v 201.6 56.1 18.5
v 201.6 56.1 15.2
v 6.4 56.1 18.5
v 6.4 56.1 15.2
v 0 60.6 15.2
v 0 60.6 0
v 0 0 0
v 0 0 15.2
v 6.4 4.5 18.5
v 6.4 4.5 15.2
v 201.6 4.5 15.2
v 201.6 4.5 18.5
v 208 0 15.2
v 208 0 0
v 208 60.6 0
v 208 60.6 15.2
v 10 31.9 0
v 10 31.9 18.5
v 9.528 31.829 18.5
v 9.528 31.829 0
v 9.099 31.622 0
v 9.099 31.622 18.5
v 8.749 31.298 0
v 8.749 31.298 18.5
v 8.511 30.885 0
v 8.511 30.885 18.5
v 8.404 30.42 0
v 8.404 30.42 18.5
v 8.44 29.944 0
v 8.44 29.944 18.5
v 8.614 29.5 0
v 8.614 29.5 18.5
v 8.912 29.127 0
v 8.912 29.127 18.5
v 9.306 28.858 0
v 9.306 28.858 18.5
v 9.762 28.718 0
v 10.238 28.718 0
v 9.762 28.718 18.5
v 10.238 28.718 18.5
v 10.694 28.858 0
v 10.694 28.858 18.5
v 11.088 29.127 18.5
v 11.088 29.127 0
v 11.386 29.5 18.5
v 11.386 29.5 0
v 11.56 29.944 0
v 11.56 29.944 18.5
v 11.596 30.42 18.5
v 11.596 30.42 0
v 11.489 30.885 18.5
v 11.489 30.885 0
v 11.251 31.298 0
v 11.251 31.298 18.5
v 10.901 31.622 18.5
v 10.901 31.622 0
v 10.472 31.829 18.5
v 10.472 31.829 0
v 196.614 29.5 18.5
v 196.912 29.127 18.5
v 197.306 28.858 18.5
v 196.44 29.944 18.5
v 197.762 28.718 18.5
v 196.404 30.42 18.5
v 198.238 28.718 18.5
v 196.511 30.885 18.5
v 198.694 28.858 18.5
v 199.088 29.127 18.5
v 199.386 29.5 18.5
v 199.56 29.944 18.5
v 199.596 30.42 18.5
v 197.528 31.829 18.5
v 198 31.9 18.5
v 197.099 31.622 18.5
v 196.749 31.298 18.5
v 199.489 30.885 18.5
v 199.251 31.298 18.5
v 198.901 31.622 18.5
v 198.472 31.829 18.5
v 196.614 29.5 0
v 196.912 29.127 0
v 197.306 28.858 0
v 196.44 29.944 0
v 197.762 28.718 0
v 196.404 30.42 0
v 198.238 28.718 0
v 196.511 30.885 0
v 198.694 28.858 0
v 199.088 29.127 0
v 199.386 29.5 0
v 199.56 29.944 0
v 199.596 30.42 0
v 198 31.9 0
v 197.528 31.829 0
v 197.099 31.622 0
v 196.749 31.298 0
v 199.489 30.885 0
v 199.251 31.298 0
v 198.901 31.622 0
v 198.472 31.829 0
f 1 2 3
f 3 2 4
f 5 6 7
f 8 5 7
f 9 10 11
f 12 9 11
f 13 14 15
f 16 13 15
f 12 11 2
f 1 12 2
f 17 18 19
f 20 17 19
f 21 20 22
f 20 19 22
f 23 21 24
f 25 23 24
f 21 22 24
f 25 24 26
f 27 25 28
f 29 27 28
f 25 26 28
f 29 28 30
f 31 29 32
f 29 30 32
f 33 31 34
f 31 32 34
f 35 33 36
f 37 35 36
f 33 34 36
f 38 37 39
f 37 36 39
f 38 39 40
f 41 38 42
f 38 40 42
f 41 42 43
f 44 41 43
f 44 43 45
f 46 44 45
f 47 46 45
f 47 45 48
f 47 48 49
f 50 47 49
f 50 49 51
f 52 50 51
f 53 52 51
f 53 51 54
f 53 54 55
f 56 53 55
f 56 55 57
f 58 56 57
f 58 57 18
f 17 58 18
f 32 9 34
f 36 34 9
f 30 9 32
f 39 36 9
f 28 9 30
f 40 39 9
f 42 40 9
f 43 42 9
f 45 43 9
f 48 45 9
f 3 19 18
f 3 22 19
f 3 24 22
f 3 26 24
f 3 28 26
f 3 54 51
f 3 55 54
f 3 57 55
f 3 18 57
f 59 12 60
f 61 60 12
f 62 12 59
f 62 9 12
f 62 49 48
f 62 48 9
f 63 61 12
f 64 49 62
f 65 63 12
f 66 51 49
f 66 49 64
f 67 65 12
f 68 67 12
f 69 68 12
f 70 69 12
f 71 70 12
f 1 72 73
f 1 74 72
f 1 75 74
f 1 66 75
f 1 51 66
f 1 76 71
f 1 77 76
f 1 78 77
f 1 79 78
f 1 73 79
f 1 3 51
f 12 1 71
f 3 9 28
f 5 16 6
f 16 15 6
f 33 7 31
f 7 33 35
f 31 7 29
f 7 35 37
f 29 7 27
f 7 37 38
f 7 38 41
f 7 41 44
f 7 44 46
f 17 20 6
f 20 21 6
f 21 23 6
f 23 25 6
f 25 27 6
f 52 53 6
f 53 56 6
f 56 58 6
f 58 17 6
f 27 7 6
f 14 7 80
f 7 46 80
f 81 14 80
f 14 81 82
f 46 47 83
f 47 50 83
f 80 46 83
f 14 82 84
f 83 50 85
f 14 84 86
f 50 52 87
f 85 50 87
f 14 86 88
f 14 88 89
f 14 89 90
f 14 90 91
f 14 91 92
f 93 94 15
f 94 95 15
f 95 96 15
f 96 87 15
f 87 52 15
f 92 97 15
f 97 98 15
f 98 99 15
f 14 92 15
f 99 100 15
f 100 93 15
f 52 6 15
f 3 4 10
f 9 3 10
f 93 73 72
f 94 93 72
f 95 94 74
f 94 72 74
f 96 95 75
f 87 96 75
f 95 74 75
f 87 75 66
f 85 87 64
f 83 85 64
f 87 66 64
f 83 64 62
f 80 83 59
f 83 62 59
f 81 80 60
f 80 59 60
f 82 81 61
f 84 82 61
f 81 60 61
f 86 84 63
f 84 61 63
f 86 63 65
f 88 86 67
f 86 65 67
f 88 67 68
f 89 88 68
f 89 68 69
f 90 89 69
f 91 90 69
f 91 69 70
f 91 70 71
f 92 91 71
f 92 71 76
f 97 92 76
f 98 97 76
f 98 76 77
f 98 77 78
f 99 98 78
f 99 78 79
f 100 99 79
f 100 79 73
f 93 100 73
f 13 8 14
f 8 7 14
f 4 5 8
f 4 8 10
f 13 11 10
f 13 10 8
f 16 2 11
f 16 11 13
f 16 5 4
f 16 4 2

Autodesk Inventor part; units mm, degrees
ref_plane "YZ Plane" through (0, 0, 0) normal (1, 0, 0) x (0, 1, 0)
ref_plane "XZ Plane" through (0, 0, 0) normal (0, 1, 0) x (-1, 0, 0)
ref_plane "XY Plane" through (0, 0, 0) normal (0, 0, 1) x (1, 0, 0)
sketch "スケッチ1" plane through (0, 0, 0) normal (0, 0, 1) x (1, 0, 0)
  line L0 (0, 0) -> (208, 0)
  line L1 (208, 0) -> (208, 60.6)
  line L2 (208, 60.6) -> (0, 60.6)
  line L3 (0, 60.6) -> (0, 0)
  line L4 (6.4, 4.5) -> (201.6, 4.5)
  line L5 (201.6, 4.5) -> (201.6, 56.1)
  line L6 (201.6, 56.1) -> (6.4, 56.1)
  line L7 (6.4, 56.1) -> (6.4, 4.5)
  dimension "d0" = 208
  dimension "d1" = 60.6
  dimension "d2" = 195.2
  dimension "d3" = 51.6
extrude "押し出し1" add sketch "スケッチ1" along normal blind 15.2
extrude "押し出し2" add sketch "スケッチ1" along normal blind 18.5 contours L7 L6 L5 L4
sketch "スケッチ2" plane through (0, 0, 0) normal (0, 0, -1) x (-1, 0, 0)
  line L0 (0, 60.6) -> (0, 0) projected
  line L1 (-208, 0) -> (-208, 60.6) projected
  line L2 (0, 0) -> (-208, 0) projected
  point P0 (-198, 30.3)
  point P1 (-10, 30.3)
  dimension "d8" = 10
  dimension "d9" = 10
  dimension "d19" = 30.3
  dimension "d22" = 30.3
hole "穴1" at (198, 30.3, 0) at (10, 30.3, 0) direction (0, 0, 1) diameter 3.2 end through all
equation "\"d19\" = d22"
properties part number "TH22_soroban_sn" material "ABS プラスチック"
